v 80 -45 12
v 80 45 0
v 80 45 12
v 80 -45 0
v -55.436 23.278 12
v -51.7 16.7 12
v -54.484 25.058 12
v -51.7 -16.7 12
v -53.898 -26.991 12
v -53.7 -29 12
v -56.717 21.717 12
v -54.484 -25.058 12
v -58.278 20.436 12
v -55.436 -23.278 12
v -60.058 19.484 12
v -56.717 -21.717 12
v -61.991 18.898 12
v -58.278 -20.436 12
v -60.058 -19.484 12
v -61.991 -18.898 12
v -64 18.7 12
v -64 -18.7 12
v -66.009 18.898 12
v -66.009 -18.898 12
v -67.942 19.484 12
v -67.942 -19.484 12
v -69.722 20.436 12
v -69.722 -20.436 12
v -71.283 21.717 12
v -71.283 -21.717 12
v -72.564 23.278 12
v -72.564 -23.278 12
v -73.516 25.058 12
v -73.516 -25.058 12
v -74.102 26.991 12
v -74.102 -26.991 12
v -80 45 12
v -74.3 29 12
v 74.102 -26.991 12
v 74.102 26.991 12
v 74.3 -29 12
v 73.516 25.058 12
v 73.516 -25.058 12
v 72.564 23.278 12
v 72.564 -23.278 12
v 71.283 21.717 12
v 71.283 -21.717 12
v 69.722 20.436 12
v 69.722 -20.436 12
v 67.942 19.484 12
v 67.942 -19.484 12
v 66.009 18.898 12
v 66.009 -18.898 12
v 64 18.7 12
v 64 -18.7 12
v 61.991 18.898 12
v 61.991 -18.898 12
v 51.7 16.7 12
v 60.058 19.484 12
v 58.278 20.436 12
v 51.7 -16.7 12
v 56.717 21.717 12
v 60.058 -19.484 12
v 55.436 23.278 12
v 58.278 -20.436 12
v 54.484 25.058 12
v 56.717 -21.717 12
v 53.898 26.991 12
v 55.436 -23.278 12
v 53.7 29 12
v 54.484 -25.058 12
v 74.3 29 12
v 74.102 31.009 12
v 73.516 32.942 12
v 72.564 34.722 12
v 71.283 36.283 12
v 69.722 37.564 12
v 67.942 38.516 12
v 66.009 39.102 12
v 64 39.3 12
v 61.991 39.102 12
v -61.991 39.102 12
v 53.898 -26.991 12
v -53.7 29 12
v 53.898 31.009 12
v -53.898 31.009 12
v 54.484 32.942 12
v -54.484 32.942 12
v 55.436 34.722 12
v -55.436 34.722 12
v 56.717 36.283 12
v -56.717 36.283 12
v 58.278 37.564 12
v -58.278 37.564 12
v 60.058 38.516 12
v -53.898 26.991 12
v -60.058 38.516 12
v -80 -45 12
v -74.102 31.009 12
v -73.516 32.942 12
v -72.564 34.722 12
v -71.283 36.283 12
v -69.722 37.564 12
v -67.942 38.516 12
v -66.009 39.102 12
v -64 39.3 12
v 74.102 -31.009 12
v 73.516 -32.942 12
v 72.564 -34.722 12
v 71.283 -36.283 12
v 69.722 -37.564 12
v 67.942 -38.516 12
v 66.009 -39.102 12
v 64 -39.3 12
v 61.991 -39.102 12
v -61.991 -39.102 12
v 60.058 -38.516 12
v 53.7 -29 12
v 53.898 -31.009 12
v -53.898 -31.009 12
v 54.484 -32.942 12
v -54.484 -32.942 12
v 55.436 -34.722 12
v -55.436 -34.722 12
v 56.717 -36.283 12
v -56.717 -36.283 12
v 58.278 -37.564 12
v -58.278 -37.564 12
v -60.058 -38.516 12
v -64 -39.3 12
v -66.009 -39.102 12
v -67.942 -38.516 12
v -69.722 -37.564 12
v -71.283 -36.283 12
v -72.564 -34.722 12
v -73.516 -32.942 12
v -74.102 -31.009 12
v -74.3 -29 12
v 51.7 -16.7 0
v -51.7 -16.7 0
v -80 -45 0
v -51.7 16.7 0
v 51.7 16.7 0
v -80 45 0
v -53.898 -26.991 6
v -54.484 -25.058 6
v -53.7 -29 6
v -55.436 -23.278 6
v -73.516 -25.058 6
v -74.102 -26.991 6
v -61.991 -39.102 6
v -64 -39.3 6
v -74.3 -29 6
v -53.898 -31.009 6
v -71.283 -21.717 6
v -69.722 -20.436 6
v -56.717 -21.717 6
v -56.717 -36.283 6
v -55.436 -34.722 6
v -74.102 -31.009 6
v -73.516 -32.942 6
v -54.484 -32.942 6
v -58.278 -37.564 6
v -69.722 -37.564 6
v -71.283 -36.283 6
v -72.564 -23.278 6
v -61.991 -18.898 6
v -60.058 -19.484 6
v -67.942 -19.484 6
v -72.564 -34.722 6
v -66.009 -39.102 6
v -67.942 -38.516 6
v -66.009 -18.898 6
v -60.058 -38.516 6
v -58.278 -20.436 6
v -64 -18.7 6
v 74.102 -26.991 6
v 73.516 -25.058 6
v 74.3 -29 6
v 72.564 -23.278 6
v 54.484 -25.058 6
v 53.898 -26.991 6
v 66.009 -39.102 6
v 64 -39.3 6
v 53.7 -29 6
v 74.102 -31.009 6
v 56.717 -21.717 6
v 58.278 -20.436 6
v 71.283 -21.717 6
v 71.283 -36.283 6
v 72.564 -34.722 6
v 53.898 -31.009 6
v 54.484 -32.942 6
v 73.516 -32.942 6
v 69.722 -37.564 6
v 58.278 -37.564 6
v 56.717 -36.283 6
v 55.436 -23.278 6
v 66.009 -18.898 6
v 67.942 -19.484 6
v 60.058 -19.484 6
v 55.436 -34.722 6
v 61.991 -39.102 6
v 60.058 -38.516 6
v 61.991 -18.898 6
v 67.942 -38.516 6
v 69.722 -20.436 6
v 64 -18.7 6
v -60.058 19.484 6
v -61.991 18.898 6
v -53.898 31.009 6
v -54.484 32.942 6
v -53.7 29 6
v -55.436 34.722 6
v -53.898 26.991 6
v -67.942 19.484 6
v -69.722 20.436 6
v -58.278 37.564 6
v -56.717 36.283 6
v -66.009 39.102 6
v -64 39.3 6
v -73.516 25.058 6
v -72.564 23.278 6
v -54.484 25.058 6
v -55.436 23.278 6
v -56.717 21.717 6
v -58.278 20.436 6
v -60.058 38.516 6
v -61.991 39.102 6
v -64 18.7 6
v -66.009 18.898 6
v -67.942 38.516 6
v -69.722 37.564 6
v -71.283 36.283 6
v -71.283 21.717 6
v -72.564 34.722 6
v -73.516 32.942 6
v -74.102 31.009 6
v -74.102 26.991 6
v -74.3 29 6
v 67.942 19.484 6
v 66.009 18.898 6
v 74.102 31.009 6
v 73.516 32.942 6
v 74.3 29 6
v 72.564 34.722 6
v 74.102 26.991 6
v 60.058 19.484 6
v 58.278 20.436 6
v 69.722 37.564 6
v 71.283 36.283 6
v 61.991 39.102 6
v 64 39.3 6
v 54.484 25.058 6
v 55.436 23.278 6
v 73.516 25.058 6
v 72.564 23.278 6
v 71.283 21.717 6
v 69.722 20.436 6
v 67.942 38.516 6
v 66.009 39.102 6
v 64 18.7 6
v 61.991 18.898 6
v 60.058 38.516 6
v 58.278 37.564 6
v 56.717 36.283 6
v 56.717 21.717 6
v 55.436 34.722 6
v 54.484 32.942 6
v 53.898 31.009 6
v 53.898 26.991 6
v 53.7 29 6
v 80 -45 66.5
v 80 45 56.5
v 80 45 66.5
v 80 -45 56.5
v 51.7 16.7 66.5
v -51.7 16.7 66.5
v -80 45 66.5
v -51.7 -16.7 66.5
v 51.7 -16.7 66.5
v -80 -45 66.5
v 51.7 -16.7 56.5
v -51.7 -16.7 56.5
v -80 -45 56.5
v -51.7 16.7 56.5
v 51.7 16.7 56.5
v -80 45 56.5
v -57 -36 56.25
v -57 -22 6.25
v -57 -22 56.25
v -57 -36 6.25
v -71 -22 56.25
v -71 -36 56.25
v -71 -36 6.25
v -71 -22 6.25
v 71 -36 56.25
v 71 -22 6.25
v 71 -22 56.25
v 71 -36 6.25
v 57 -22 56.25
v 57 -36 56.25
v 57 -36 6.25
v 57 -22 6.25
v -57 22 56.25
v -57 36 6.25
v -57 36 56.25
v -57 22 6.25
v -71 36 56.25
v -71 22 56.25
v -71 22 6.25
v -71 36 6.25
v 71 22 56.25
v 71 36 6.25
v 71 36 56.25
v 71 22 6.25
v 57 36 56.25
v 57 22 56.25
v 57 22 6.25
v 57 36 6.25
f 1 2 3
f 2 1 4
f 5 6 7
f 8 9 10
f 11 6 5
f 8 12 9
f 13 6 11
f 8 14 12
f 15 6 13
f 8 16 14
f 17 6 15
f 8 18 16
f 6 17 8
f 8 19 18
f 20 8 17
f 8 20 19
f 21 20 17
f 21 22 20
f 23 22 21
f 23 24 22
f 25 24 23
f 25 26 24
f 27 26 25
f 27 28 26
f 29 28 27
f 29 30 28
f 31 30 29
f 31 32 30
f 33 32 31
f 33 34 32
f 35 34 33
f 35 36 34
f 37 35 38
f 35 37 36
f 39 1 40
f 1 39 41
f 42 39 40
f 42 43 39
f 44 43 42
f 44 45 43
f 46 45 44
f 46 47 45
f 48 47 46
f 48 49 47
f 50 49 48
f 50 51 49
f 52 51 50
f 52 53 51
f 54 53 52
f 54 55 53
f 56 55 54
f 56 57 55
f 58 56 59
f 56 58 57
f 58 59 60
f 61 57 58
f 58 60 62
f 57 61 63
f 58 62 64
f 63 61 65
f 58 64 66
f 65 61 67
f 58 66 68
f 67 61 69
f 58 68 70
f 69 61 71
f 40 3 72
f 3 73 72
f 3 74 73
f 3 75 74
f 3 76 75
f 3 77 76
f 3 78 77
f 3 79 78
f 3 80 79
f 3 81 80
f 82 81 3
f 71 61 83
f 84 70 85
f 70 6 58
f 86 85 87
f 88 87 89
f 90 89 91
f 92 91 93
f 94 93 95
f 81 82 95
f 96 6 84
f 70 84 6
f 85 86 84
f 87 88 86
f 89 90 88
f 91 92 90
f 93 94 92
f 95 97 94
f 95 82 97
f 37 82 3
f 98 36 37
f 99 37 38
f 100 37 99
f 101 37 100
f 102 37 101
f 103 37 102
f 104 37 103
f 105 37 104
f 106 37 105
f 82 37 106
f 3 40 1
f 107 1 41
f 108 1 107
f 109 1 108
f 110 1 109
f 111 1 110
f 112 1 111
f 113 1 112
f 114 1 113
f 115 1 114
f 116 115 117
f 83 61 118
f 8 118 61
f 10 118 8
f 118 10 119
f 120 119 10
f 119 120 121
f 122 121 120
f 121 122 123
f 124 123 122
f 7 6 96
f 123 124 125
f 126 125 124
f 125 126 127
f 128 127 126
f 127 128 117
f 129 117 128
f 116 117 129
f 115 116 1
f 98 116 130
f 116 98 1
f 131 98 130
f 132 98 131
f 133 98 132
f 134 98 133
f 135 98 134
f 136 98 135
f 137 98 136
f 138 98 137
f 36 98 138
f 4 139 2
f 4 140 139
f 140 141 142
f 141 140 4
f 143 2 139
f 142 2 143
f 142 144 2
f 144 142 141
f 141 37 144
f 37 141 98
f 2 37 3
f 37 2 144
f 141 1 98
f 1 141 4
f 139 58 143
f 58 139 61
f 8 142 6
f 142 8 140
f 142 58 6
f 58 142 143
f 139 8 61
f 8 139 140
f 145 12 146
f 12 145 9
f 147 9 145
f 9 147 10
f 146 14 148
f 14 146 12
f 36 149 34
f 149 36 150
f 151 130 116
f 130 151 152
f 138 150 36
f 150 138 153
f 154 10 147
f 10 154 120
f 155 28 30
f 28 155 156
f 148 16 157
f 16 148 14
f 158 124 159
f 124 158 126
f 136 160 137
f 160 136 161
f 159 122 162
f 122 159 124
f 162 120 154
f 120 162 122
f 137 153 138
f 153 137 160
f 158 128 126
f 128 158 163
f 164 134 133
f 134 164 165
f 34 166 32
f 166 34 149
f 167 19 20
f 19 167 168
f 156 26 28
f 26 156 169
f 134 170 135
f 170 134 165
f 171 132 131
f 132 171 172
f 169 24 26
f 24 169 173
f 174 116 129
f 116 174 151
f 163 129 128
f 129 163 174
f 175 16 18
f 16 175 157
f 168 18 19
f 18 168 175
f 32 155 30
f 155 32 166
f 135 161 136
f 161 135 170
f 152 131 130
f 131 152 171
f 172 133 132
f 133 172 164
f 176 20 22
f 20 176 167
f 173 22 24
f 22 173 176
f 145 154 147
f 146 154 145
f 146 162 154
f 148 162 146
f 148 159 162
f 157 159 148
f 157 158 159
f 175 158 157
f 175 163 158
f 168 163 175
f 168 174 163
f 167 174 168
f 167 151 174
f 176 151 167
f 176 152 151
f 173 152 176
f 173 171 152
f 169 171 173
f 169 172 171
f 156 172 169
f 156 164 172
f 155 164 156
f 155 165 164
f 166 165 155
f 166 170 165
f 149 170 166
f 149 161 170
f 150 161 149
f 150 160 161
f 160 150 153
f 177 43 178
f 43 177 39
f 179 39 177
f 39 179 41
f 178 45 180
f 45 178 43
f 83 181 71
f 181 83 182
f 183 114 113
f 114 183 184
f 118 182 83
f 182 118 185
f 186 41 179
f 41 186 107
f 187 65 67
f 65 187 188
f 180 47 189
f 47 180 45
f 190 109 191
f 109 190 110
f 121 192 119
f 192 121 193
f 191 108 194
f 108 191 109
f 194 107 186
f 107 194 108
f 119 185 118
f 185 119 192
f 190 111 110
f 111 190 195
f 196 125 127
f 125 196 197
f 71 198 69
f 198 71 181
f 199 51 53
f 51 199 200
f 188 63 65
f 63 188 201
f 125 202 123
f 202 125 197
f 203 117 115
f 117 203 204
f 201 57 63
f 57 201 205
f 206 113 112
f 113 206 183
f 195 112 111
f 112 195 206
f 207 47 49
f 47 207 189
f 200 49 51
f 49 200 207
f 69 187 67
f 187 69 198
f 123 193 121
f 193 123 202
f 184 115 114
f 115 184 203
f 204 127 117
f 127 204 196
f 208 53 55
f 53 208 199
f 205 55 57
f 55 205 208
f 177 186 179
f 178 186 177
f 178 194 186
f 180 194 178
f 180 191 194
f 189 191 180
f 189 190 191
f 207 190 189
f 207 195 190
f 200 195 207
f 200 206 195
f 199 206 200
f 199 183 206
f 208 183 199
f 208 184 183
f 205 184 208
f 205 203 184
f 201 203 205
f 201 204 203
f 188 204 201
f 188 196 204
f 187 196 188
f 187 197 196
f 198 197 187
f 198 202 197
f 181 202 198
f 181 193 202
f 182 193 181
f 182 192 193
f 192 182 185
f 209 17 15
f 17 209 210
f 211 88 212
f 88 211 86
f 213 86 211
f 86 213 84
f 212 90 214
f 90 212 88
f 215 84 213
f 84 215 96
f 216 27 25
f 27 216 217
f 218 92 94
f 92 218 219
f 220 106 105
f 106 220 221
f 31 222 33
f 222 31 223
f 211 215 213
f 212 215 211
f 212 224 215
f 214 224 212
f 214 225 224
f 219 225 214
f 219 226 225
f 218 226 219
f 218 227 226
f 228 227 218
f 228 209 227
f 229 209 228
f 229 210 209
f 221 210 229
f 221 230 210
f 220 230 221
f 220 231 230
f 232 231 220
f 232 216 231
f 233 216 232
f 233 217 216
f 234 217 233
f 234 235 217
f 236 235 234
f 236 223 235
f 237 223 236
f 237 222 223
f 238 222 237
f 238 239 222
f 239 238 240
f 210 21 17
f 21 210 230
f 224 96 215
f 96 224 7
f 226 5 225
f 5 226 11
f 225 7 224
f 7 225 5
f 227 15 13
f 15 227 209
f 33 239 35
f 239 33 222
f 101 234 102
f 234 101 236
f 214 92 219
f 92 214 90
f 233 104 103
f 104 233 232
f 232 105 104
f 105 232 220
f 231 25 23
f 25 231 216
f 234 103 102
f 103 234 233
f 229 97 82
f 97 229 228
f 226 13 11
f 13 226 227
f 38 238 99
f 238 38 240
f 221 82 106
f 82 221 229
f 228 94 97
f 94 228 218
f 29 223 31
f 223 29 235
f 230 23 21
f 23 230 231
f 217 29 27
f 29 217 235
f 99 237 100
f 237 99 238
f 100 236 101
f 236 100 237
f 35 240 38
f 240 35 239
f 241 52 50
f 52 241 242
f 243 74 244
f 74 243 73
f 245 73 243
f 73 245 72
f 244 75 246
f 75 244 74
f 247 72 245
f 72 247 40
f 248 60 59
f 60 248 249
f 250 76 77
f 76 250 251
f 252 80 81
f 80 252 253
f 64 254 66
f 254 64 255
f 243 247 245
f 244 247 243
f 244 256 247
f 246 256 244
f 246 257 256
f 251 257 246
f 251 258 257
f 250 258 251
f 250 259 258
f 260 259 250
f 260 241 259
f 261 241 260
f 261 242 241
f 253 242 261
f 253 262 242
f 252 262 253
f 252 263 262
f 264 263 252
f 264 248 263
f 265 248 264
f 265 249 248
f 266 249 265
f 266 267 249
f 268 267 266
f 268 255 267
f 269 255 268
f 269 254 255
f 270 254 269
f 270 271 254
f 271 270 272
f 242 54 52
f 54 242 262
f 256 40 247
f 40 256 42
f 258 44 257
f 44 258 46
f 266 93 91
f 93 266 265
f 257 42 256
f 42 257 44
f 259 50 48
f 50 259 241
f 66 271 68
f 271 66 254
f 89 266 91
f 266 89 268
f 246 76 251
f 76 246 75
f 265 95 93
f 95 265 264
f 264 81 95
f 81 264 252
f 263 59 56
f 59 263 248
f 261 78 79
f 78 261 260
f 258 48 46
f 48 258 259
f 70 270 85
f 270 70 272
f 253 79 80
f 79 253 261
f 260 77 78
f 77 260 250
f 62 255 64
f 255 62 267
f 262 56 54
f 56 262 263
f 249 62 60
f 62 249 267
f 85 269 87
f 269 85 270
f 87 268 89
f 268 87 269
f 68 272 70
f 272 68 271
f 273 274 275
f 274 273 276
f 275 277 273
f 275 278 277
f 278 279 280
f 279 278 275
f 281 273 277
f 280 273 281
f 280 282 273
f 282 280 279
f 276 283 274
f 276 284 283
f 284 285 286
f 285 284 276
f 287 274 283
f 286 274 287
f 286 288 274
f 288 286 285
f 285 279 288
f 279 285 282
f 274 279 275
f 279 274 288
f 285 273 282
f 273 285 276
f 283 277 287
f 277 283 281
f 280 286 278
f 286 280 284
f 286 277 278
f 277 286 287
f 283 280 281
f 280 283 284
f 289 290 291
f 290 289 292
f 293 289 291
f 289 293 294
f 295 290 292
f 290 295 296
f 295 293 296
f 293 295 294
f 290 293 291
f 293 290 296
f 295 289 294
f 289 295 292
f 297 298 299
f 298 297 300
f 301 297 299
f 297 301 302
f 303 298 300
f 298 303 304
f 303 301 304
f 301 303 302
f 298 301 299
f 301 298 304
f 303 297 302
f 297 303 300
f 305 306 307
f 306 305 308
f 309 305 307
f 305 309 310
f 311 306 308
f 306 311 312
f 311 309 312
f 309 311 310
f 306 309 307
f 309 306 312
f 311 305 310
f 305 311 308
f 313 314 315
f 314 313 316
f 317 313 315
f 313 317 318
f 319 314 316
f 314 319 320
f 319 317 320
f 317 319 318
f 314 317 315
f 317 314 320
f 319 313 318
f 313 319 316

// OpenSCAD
$fn = 32;

// ------------------------------------------------------------------------
// Frame cube: base 160 x 90 mm, posts 50 mm tall
// Every part is its own module, assembly() places every instance.
// ------------------------------------------------------------------------

// --- part 1 ---
module base_frame() {
  difference() {
    translate([-80, -45, 0]) cube([160, 90, 12]);
    translate([-51.7, -16.7, -1]) cube([103.4, 33.4, 14]);
    translate([-64, -29, 6]) cylinder(h = 7, d = 20.6);
    translate([64, -29, 6]) cylinder(h = 7, d = 20.6);
    translate([-64, 29, 6]) cylinder(h = 7, d = 20.6);
    translate([64, 29, 6]) cylinder(h = 7, d = 20.6);
  }
}

// --- part 2 ---
module corner_post() {
  translate([-7, -7, 0]) cube([14, 14, 50]);
}

// --- part 3 ---
module top_frame() {
  difference() {
    translate([-80, -45, 0]) cube([160, 90, 10]);
    translate([-51.7, -16.7, -1]) cube([103.4, 33.4, 12]);
  }
}

// --- assembly ---
module assembly() {
  color([0.80, 0.24, 0.20]) translate([0, 0, 0]) rotate([0, 0, 0]) base_frame();
  color([0.20, 0.45, 0.75]) translate([-64, -29, 6.25]) rotate([0, 0, 0]) corner_post();
  color([0.25, 0.62, 0.32]) translate([64, -29, 6.25]) rotate([0, 0, 0]) corner_post();
  color([0.92, 0.70, 0.18]) translate([-64, 29, 6.25]) rotate([0, 0, 0]) corner_post();
  color([0.58, 0.35, 0.70]) translate([64, 29, 6.25]) rotate([0, 0, 0]) corner_post();
  color([0.16, 0.66, 0.66]) translate([0, 0, 56.5]) rotate([0, 0, 0]) top_frame();
}

assembly();
